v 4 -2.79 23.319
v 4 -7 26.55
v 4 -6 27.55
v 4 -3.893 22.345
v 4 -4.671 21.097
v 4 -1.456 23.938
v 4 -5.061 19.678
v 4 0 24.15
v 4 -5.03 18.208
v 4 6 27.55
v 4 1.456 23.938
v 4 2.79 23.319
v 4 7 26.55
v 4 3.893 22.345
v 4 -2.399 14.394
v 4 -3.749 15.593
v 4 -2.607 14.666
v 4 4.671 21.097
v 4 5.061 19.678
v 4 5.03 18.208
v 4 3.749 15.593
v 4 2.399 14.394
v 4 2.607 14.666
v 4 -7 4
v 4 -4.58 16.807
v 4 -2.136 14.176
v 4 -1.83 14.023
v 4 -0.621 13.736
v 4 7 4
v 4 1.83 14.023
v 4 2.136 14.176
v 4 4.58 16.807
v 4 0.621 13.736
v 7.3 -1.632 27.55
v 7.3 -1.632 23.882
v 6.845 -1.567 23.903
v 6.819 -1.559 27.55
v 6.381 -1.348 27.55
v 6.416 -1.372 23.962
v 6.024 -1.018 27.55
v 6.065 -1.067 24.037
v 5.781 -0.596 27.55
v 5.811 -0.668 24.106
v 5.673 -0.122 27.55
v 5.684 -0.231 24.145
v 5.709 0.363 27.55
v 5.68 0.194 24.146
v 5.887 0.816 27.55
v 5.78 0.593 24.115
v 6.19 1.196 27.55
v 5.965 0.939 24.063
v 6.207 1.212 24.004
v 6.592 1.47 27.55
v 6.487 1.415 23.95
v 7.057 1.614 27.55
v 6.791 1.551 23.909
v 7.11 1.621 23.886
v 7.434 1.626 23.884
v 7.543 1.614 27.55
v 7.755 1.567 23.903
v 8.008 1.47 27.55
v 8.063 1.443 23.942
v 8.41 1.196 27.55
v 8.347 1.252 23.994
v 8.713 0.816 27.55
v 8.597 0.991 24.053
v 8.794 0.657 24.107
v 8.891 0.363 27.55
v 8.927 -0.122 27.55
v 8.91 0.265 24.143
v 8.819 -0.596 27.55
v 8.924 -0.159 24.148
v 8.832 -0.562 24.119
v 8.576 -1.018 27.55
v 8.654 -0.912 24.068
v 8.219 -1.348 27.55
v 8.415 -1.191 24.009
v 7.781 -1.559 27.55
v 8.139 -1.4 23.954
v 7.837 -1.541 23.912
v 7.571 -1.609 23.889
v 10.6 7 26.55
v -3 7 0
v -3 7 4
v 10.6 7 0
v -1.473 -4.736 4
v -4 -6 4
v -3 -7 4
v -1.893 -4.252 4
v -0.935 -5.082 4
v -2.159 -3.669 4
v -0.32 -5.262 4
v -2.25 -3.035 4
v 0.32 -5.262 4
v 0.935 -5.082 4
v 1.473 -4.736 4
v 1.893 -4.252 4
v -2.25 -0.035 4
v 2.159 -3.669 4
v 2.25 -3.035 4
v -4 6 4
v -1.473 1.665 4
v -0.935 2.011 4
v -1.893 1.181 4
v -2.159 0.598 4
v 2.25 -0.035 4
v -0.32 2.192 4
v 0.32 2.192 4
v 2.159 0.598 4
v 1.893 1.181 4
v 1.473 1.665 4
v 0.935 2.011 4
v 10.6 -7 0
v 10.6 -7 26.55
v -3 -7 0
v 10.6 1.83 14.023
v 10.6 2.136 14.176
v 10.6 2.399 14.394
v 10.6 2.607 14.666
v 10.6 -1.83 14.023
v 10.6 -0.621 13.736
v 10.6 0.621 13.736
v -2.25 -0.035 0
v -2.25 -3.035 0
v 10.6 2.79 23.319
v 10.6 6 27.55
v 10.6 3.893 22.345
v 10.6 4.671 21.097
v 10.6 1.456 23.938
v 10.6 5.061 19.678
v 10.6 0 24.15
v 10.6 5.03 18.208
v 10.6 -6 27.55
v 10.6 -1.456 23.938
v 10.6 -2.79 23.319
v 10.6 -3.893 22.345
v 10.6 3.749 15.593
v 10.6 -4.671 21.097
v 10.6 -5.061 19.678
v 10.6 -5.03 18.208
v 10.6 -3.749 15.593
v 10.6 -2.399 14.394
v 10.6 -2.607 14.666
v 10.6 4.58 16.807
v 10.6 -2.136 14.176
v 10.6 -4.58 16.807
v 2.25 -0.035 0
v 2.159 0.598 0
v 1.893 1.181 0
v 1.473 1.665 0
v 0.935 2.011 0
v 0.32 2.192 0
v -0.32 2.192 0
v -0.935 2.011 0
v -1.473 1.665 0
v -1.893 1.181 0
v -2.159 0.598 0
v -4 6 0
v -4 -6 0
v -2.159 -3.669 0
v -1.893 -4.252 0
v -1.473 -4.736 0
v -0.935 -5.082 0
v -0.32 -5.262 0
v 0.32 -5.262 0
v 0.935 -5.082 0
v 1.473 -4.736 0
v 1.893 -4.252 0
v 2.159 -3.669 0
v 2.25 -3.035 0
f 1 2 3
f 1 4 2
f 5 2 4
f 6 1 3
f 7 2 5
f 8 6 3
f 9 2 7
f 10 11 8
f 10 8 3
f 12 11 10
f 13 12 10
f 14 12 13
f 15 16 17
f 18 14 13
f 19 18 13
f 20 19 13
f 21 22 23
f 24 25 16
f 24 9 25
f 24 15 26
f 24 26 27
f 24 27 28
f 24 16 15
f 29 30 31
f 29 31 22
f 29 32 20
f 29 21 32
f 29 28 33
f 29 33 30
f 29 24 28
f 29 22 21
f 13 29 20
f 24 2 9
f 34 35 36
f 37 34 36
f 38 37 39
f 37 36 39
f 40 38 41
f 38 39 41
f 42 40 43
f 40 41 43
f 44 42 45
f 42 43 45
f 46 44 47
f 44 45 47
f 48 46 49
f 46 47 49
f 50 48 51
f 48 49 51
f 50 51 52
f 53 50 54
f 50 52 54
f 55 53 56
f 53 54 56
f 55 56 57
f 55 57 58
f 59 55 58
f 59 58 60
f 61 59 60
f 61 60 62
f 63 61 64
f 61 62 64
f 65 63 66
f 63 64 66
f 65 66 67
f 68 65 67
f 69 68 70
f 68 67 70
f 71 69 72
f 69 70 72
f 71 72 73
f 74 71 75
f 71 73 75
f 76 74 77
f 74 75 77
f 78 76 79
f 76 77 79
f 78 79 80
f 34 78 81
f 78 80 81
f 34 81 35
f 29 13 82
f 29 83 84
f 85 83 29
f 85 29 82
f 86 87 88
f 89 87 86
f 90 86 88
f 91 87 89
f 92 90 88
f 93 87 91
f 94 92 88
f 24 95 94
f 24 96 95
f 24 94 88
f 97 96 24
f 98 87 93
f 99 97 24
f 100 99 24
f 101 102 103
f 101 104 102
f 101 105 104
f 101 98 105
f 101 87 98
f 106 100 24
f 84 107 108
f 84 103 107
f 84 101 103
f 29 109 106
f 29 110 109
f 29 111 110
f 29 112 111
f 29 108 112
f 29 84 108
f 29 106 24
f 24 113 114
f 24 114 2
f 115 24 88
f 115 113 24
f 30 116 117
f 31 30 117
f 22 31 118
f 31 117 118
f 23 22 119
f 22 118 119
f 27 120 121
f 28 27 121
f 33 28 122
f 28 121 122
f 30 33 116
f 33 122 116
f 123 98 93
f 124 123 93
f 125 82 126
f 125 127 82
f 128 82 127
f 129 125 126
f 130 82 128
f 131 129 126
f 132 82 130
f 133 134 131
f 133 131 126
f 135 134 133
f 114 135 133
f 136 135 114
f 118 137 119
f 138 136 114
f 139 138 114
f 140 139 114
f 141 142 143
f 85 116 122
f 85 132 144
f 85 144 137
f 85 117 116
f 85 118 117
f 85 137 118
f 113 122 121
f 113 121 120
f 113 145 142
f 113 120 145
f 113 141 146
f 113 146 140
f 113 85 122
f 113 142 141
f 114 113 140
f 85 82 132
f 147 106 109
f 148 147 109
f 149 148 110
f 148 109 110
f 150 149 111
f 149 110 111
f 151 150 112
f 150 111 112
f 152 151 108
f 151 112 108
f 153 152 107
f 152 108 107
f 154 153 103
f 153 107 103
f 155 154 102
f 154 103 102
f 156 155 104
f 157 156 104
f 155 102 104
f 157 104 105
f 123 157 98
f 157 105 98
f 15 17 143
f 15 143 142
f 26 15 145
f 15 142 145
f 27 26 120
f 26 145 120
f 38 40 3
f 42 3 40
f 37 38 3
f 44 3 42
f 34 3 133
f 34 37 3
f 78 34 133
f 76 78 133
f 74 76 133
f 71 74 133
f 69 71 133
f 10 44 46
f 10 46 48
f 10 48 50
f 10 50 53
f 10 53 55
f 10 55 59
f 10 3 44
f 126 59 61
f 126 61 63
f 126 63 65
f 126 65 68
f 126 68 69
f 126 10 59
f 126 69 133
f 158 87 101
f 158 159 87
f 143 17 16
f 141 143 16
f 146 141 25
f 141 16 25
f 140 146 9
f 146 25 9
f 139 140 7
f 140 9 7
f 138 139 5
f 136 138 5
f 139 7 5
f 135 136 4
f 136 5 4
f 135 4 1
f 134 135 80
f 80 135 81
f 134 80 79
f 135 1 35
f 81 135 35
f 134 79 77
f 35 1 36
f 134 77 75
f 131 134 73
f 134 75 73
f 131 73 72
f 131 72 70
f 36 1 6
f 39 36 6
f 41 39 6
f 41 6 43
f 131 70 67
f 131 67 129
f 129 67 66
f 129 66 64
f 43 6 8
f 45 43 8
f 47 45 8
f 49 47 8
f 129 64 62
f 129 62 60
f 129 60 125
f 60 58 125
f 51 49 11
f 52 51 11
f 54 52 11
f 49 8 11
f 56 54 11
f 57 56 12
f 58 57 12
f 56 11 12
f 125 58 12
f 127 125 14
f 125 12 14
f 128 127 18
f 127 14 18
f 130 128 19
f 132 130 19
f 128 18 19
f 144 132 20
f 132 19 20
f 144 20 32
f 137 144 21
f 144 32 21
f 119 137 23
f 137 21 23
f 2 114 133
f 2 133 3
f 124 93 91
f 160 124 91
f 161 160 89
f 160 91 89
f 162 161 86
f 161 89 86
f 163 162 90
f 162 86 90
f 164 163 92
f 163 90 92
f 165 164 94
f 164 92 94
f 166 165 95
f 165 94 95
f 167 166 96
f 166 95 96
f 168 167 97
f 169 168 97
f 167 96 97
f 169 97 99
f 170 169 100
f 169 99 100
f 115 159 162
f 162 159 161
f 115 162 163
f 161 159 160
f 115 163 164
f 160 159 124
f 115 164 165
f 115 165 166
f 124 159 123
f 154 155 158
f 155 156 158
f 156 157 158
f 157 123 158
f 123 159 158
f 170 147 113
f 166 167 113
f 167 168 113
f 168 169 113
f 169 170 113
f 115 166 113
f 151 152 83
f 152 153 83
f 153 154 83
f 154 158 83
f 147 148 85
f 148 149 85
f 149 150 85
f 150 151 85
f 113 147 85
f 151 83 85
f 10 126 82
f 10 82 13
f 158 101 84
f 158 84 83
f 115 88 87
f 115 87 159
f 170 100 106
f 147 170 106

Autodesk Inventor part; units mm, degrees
ref_plane "YZ Plane" through (0, 0, 0) normal (1, 0, 0) x (0, 1, 0)
ref_plane "XZ Plane" through (0, 0, 0) normal (0, 1, 0) x (-1, 0, 0)
ref_plane "XY Plane" through (0, 0, 0) normal (0, 0, 1) x (1, 0, 0)
sketch "Sketch1" plane through (0, 0, 0) normal (0, 0, 1) x (1, 0, 0)
  line L0 (-4, 7) -> (4, 7)
  line L1 (4, 7) -> (4, -7)
  line L2 (4, -7) -> (-4, -7)
  line L3 (-4, -7) -> (-4, 7)
  point P0 (0, 0)
  dimension "WIDTH" = 14
  dimension "d1" = 7
  dimension "d2" = 4
  dimension "LENGTH" = 8
extrude "Extrusion1" add sketch "Sketch1" along normal blind 4
sketch "Sketch2" plane through (0, 0, 4) normal (0, 0, 1) x (1, 0, 0)
  line L0 (0, -3.0354) -> (0, -0.0354) construction
  line L1 (2.25, -3.0354) -> (2.25, -0.0354)
  line L2 (-2.25, -0.0354) -> (-2.25, -3.0354)
  arc A0 (-2.25, -3.0354) -> (2.25, -3.0354) centre (0, -3.0354) ccw
  arc A1 (2.25, -0.0354) -> (-2.25, -0.0354) centre (0, -0.0354) ccw
  point P0 (0, -1.5354)
  point P1 (0, 0)
  dimension "d44" = 0
  dimension "d45" = 1.5354
  dimension "d55" = 2.25
  dimension "d56" = 3
extrude "Extrusion3" cut sketch "Sketch2" against normal through all
sketch "Sketch3" plane through (0, 0, 0) normal (0, 0, 1) x (1, 0, 0)
  line L0 (4, 7) -> (10.6, 7)
  line L1 (10.6, 7) -> (10.6, -7)
  line L2 (10.6, -7) -> (4, -7)
  line L3 (4, -7) -> (4, 7)
  line L4 (4, -7) -> (4, 7) projected
  line L5 (4, 7) -> (-4, 7) projected
  point P0 (0, 0)
  dimension "d15" = 0
  dimension "d16" = 0
  dimension "d17" = 6.6
  dimension "d18" = 14
extrude "Extrusion2" add sketch "Sketch3" along normal blind 27.55
sketch "Sketch4" plane through (10.6, -7, 0) normal (1, 0, 0) x (0, 0, -1)
  point P0 (0, 7)
  point P1 (-19.05, 7)
  dimension "d28" = 0
  dimension "d29" = 19.05
hole "Hole2" at (10.6, 0, 19.05) direction (-1, 0, 0) diameter 10.2 end through all
sketch "Sketch5" plane through (0, 0, 27.55) normal (0, 0, 1) x (1, 0, 0)
  line L0 (10.6, -7) -> (10.6, 7) projected
  point P0 (0, 0)
  point P1 (7.3, 0)
  dimension "d37" = 0
  dimension "d38" = 3.3
hole "Hole3" at (7.3, 0, 27.55) direction (0, 0, -1) diameter 3.2639 end up to surface
chamfer "Chamfer1" distance 1 angle 45 4 edges at (7.3, 7, 27.55) (7.3, -7, 27.55) (-4, -7, 2) (-4, 7, 2)
sketch "Sketch7" plane through (10.6, -7, 0) normal (1, 0, 0) x (0, 0, -1)
  circle A0 centre (-19.05, 7) radius 5.35
  circle A1 centre (-19.05, 7) radius 5.1 projected
  circle A2 centre (-15.4322, 5.6832) radius 1.5
  circle A3 centre (-15.4322, 8.3168) radius 1.5
  line L0 (-15.4322, 5.6832) -> (-19.05, 7)
  line L1 (-19.05, 7) -> (-15.4322, 8.3168)
  line L2 (-19.05, 7) -> (-13.7, 7)
  point P0 (0, 7)
  point P1 (-14.0226, 8.8298)
  point P2 (-14.6664, 9.6066)
  point P3 (-14.6664, 4.3934)
  point P4 (-14.0226, 5.1702)
  dimension "d61" = 10.7
  dimension "d59" = 0
  dimension "d60" = 0
  dimension "d62" = 3
  dimension "d63" = 3
  dimension "d65" = 3.85
  dimension "d66" = 3.85
  dimension "d67" = 20
  dimension "d68" = 20
extrude "Extrusion4" cut sketch "Sketch7" against normal through all contours L2 A1 A3 A0 | A0 A2 A1 L2 | A3 A1 | A2 A1
equation "\"d1\" = 0.5 * WIDTH"
equation "\"d2\" = 0.5 * LENGTH"
equation "\"d18\" = WIDTH"
equation "\"d29\" = BEAM_HEIGHT"
equation "\"d38\" = 0.5 * d17"
equation "\"d65\" = 0.5 * d61 - 0.5 * d62"
equation "\"d66\" = 0.5 * d61 - 0.5 * d62"
equation "\"BEAM_HEIGHT\" = 19.05"
properties part number "shutter-mount"
